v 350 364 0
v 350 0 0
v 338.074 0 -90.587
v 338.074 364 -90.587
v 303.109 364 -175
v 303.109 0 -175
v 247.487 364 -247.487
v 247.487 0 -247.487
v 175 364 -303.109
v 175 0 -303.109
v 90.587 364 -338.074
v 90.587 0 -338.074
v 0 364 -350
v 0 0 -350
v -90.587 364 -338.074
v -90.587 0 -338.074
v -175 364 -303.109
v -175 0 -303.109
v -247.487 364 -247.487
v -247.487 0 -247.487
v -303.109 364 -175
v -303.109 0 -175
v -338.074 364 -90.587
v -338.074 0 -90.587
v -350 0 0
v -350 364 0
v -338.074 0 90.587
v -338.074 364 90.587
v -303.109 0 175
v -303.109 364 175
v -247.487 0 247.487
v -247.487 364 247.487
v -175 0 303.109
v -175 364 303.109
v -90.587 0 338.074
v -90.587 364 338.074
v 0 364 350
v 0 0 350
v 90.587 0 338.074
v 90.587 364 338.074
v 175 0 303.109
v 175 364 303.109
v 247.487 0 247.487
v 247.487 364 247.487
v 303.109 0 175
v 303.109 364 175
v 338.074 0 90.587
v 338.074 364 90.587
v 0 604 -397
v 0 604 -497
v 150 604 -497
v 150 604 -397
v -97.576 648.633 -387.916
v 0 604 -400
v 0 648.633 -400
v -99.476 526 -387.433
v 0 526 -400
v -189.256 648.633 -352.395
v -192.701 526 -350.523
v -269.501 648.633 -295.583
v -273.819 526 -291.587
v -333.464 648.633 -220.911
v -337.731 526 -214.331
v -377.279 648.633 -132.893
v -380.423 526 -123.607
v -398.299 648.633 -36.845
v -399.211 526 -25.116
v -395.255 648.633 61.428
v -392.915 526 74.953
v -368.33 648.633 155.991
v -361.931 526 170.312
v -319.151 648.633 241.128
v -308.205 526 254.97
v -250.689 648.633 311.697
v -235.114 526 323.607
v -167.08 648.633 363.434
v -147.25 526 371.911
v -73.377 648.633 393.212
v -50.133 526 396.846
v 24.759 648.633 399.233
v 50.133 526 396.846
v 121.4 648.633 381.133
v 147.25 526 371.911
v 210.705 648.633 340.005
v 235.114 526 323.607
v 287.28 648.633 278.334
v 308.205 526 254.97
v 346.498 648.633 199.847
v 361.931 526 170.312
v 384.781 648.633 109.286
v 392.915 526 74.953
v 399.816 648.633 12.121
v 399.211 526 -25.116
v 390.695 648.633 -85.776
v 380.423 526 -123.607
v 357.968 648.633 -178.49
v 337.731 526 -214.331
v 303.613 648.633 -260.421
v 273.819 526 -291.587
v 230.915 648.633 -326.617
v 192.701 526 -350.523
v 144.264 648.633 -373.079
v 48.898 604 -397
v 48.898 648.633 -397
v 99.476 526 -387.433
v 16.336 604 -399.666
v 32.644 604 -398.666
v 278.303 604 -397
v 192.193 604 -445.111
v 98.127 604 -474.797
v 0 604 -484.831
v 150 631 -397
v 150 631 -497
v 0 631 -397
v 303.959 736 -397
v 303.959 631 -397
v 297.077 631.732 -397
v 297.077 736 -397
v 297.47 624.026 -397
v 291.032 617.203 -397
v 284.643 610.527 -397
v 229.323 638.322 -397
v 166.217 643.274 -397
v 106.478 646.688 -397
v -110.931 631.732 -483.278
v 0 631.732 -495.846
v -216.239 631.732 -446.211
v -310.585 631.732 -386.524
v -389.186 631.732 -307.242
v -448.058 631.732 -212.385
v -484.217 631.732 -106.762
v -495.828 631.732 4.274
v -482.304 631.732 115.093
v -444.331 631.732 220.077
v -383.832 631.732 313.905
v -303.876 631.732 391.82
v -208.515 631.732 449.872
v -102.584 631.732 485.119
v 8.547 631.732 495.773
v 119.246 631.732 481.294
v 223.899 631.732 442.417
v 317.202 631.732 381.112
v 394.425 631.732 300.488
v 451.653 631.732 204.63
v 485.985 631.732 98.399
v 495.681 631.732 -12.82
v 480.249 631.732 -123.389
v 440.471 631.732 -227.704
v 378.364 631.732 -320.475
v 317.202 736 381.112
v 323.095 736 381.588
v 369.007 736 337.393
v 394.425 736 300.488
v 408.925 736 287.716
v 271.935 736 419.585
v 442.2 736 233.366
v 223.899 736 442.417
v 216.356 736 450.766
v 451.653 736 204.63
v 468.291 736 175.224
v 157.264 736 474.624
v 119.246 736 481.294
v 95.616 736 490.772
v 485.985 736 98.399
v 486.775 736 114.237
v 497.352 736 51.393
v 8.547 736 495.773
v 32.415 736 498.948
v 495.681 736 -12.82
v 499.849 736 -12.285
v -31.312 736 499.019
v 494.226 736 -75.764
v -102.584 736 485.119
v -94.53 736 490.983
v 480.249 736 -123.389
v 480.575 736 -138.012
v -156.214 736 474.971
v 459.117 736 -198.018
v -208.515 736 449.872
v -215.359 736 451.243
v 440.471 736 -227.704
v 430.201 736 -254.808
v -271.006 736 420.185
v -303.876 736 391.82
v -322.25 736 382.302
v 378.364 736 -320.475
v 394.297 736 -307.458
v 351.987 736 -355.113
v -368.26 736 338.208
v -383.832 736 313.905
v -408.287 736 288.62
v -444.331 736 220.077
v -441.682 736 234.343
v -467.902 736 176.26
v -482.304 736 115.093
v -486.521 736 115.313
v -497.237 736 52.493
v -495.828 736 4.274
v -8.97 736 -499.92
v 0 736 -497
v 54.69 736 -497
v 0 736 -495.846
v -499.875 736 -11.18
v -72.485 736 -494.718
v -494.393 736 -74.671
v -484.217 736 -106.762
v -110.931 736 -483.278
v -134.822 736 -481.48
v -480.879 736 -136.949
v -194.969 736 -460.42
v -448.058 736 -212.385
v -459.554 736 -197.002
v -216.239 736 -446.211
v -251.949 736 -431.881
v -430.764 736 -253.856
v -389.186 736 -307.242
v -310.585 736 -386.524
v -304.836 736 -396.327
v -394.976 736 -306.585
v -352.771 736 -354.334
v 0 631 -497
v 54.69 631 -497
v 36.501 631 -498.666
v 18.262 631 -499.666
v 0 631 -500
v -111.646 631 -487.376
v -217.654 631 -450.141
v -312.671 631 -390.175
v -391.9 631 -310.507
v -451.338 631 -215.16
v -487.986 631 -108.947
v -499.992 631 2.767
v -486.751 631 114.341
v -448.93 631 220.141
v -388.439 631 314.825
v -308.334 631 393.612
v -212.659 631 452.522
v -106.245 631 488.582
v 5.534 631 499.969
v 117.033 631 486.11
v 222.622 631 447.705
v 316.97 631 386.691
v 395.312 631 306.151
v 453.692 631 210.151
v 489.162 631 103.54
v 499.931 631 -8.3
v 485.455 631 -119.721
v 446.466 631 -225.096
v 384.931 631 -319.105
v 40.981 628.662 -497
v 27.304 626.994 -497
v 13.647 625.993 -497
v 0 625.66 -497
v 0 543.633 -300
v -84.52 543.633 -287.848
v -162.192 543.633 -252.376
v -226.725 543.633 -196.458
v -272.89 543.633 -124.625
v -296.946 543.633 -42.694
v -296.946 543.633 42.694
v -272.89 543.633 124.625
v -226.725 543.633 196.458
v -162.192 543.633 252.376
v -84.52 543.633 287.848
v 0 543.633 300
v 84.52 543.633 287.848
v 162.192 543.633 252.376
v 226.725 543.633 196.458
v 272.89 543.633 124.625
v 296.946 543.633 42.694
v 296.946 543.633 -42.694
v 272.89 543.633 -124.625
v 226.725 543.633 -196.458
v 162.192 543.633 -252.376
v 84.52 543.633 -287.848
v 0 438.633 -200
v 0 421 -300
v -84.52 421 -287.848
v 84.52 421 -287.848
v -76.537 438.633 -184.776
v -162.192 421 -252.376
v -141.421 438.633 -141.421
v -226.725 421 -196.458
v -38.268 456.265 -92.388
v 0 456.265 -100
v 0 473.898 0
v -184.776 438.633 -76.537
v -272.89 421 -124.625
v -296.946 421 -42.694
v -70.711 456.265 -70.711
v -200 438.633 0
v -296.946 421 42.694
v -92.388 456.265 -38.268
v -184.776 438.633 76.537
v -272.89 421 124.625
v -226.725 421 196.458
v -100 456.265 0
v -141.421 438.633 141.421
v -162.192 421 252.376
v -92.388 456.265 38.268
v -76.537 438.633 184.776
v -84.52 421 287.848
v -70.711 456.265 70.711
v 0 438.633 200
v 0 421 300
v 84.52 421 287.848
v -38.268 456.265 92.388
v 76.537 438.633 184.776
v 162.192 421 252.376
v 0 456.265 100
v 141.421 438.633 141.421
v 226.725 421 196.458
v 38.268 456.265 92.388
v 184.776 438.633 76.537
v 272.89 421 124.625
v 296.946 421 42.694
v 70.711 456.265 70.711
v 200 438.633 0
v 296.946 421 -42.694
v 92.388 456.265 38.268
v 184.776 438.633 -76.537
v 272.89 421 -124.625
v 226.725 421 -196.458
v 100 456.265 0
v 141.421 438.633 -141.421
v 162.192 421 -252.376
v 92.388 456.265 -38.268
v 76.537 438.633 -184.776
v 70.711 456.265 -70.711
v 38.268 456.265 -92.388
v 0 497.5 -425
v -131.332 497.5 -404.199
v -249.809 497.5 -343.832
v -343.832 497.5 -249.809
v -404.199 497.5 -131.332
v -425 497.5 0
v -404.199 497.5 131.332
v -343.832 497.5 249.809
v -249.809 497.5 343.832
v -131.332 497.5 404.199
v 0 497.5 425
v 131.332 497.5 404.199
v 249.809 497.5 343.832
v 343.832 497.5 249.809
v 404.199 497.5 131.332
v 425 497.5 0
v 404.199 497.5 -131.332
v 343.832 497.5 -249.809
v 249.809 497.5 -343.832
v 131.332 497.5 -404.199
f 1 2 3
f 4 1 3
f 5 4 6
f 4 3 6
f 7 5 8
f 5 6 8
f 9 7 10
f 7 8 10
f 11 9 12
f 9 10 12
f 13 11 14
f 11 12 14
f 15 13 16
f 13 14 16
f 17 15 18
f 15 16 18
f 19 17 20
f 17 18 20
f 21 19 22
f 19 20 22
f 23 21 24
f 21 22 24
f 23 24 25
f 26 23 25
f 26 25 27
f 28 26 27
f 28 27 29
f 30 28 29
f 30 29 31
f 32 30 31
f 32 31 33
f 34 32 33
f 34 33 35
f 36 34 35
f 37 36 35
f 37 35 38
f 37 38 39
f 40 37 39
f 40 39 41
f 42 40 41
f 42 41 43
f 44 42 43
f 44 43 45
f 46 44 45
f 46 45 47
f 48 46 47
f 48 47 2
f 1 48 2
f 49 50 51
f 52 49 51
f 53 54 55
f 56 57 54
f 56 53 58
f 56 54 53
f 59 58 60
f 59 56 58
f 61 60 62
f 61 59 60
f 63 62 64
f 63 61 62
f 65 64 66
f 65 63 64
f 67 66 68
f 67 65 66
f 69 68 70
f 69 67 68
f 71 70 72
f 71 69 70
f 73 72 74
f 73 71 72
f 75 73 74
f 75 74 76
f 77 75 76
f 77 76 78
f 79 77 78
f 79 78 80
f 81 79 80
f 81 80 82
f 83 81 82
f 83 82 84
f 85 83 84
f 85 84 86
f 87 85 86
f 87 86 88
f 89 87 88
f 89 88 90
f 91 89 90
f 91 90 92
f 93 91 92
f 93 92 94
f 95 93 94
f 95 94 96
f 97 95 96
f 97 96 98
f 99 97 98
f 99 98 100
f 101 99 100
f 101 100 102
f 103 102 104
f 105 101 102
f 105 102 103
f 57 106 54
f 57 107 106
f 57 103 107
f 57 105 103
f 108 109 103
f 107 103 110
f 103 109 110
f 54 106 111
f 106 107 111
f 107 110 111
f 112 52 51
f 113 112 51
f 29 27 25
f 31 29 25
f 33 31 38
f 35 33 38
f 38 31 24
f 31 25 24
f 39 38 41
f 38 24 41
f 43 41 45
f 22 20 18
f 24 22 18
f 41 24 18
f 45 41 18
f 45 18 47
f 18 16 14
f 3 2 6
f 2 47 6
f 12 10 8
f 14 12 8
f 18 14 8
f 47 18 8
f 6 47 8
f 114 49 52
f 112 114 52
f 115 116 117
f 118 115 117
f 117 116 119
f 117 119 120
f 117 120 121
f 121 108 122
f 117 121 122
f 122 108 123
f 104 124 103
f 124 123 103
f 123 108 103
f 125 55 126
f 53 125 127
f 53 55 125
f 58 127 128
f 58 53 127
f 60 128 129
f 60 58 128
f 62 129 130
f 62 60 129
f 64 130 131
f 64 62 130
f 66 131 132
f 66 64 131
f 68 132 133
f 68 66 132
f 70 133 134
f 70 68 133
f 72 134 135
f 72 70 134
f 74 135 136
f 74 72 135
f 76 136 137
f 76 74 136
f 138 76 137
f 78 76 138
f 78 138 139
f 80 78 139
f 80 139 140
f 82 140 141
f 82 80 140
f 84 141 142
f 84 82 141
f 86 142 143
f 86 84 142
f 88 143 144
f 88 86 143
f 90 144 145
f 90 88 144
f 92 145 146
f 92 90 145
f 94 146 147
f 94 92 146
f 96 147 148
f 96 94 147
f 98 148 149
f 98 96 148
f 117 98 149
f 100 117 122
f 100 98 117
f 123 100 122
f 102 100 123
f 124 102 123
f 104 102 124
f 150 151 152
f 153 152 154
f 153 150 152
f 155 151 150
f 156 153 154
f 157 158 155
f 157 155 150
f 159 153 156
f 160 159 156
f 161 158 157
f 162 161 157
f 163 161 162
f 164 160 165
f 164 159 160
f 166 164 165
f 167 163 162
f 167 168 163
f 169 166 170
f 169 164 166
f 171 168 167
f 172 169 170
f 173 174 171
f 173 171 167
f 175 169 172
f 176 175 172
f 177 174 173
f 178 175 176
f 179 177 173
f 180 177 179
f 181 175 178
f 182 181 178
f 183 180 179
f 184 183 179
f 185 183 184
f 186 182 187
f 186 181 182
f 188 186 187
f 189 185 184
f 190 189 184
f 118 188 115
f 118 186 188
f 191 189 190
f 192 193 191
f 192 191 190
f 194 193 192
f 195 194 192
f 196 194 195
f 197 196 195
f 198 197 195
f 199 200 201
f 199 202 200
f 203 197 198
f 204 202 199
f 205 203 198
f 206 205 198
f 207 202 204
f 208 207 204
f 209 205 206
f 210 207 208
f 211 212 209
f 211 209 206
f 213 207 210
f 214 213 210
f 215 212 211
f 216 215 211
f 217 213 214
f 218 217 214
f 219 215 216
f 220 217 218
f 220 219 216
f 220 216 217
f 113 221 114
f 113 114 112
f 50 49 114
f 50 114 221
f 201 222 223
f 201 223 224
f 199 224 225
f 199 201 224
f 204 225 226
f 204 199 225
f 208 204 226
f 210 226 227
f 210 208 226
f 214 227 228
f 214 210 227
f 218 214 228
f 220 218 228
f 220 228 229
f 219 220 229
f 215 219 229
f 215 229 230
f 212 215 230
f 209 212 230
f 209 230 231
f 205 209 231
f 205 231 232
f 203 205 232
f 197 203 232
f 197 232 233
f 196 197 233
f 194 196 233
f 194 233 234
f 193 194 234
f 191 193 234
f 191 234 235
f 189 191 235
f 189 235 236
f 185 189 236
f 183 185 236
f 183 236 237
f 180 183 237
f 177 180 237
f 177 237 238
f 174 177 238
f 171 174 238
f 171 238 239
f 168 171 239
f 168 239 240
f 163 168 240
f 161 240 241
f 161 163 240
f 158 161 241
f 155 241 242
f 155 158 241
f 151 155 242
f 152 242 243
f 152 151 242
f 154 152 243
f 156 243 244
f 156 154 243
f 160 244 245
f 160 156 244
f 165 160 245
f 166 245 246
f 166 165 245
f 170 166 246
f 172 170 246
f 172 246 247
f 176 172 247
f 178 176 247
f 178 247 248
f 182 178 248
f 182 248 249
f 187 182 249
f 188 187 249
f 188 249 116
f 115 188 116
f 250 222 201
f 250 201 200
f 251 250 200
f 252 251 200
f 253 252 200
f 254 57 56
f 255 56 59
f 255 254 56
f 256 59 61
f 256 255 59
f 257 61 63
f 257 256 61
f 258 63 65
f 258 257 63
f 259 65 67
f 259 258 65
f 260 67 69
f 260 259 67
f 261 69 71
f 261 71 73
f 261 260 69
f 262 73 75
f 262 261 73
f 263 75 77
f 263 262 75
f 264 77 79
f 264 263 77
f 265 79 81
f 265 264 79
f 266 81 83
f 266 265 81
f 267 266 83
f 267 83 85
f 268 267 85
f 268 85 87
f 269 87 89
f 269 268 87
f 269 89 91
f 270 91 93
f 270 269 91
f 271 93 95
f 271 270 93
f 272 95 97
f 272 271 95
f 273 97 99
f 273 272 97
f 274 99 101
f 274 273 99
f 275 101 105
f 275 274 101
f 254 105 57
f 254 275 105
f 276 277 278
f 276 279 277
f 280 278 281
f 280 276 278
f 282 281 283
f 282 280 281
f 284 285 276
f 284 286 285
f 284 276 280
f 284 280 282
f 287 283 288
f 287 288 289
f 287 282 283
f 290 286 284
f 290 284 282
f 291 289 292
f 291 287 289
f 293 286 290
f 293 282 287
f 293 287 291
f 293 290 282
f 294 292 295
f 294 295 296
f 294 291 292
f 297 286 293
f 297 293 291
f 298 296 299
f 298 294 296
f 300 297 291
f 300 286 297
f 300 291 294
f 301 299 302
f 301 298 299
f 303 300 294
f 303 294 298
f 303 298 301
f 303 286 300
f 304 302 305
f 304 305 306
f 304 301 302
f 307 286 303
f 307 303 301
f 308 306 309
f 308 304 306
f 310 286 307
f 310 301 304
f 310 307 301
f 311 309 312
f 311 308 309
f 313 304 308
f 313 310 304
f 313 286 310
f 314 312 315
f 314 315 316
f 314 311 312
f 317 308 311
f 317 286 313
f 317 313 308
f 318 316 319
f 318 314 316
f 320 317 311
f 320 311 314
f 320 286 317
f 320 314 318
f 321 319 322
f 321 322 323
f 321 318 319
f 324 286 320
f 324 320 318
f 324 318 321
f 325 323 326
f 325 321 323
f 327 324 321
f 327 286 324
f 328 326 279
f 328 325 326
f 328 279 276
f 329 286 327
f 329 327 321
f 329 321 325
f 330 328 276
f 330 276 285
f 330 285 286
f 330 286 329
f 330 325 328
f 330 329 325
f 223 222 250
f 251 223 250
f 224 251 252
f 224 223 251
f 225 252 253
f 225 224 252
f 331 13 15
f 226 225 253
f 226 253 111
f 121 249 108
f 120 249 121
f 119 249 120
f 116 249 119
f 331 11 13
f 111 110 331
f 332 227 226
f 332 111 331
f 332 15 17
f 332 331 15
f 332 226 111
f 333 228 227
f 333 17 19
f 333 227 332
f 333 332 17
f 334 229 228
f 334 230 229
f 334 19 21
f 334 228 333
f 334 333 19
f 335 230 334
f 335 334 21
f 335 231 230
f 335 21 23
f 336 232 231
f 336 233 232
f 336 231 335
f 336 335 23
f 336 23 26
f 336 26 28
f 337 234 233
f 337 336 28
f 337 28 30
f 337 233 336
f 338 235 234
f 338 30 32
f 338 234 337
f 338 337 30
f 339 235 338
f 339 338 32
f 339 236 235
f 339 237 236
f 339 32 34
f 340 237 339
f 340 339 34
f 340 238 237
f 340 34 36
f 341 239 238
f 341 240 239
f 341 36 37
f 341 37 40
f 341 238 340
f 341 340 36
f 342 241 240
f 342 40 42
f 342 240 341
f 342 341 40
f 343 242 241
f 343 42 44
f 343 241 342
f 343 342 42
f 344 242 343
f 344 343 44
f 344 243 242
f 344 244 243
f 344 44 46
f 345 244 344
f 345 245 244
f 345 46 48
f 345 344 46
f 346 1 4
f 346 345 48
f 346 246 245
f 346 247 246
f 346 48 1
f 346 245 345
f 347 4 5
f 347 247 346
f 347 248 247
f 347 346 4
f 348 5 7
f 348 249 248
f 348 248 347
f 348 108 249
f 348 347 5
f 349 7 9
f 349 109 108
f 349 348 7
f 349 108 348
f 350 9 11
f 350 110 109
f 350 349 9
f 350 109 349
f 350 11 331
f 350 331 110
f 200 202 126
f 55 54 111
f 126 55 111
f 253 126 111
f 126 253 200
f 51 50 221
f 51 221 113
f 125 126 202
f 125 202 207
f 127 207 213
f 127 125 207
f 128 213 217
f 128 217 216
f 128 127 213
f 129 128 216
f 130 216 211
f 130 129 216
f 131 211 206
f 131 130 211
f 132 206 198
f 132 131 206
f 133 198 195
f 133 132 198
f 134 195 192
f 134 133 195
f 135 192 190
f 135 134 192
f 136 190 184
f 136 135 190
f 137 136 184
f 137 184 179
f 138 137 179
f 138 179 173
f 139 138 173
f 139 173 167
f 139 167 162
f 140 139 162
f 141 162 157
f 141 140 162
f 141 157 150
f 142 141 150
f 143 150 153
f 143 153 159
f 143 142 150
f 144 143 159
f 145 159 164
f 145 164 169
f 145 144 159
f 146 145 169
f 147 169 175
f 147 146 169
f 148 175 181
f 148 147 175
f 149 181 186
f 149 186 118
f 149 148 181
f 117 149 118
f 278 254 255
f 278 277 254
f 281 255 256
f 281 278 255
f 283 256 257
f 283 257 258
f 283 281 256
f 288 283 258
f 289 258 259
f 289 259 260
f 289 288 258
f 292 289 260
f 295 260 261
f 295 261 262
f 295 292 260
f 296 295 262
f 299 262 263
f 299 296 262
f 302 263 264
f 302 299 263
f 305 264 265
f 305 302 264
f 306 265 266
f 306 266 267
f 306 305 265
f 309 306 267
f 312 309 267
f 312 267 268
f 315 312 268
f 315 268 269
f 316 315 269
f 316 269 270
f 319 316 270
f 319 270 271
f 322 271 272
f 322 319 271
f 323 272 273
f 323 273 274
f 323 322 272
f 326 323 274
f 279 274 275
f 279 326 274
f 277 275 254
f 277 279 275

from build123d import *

# Parameters (mm, degrees)
SKETCH1_R           = 350
BOSS_EXTRUDE1_DEPTH = 364
SKETCH6_W           = 1000
SKETCH6_H           = 100
CUT_EXTRUDE1_DEPTH  = 133
SKETCH4_W           = 150
SKETCH4_H           = 100
BOSS_EXTRUDE2_DEPTH = 27


with BuildPart() as part:
    # Sketch1 → Boss-Extrude1 (new body)
    with BuildSketch(Plane(origin=(0, 0, 0), x_dir=(1, 0, 0), z_dir=(0, 1, 0))):
        Circle(SKETCH1_R)
    extrude(amount=BOSS_EXTRUDE1_DEPTH)

    # Sketch3 → Revolve1 (revolve)
    with BuildSketch(Plane(origin=(0, 0, 0), x_dir=(0, 0, -1), z_dir=(1, 0, 0))):
        Polygon((350, 364), (500, 631), (500, 736), (495.846454364, 736), (495.846454364, 631.732382161), (400, 648.632698071), (400, 526), (300, 543.632698071), (300, 421), (0, 473.898094213), (0, 364), align=None)
    revolve(axis=Axis((0, 364, 0), (0, 1, 0)))

    # Sketch6 → Cut-Extrude1 (cut, through all)
    with BuildSketch(Plane(origin=(0, 604, 0), x_dir=(-1, 0, 0), z_dir=(0, -1, 0))):
        with Locations((-500, 447)):
            Rectangle(SKETCH6_W, SKETCH6_H)
    extrude(amount=-CUT_EXTRUDE1_DEPTH, mode=Mode.SUBTRACT)


with BuildPart() as body_2:
    # Sketch4 → Boss-Extrude2 (new body)
    with BuildSketch(Plane(origin=(0, 604, 0), x_dir=(1, 0, 0), z_dir=(0, 1, 0))):
        with Locations((75, 447)):
            Rectangle(SKETCH4_W, SKETCH4_H)
    extrude(amount=BOSS_EXTRUDE2_DEPTH)


solid = Compound([part.part, body_2.part])
